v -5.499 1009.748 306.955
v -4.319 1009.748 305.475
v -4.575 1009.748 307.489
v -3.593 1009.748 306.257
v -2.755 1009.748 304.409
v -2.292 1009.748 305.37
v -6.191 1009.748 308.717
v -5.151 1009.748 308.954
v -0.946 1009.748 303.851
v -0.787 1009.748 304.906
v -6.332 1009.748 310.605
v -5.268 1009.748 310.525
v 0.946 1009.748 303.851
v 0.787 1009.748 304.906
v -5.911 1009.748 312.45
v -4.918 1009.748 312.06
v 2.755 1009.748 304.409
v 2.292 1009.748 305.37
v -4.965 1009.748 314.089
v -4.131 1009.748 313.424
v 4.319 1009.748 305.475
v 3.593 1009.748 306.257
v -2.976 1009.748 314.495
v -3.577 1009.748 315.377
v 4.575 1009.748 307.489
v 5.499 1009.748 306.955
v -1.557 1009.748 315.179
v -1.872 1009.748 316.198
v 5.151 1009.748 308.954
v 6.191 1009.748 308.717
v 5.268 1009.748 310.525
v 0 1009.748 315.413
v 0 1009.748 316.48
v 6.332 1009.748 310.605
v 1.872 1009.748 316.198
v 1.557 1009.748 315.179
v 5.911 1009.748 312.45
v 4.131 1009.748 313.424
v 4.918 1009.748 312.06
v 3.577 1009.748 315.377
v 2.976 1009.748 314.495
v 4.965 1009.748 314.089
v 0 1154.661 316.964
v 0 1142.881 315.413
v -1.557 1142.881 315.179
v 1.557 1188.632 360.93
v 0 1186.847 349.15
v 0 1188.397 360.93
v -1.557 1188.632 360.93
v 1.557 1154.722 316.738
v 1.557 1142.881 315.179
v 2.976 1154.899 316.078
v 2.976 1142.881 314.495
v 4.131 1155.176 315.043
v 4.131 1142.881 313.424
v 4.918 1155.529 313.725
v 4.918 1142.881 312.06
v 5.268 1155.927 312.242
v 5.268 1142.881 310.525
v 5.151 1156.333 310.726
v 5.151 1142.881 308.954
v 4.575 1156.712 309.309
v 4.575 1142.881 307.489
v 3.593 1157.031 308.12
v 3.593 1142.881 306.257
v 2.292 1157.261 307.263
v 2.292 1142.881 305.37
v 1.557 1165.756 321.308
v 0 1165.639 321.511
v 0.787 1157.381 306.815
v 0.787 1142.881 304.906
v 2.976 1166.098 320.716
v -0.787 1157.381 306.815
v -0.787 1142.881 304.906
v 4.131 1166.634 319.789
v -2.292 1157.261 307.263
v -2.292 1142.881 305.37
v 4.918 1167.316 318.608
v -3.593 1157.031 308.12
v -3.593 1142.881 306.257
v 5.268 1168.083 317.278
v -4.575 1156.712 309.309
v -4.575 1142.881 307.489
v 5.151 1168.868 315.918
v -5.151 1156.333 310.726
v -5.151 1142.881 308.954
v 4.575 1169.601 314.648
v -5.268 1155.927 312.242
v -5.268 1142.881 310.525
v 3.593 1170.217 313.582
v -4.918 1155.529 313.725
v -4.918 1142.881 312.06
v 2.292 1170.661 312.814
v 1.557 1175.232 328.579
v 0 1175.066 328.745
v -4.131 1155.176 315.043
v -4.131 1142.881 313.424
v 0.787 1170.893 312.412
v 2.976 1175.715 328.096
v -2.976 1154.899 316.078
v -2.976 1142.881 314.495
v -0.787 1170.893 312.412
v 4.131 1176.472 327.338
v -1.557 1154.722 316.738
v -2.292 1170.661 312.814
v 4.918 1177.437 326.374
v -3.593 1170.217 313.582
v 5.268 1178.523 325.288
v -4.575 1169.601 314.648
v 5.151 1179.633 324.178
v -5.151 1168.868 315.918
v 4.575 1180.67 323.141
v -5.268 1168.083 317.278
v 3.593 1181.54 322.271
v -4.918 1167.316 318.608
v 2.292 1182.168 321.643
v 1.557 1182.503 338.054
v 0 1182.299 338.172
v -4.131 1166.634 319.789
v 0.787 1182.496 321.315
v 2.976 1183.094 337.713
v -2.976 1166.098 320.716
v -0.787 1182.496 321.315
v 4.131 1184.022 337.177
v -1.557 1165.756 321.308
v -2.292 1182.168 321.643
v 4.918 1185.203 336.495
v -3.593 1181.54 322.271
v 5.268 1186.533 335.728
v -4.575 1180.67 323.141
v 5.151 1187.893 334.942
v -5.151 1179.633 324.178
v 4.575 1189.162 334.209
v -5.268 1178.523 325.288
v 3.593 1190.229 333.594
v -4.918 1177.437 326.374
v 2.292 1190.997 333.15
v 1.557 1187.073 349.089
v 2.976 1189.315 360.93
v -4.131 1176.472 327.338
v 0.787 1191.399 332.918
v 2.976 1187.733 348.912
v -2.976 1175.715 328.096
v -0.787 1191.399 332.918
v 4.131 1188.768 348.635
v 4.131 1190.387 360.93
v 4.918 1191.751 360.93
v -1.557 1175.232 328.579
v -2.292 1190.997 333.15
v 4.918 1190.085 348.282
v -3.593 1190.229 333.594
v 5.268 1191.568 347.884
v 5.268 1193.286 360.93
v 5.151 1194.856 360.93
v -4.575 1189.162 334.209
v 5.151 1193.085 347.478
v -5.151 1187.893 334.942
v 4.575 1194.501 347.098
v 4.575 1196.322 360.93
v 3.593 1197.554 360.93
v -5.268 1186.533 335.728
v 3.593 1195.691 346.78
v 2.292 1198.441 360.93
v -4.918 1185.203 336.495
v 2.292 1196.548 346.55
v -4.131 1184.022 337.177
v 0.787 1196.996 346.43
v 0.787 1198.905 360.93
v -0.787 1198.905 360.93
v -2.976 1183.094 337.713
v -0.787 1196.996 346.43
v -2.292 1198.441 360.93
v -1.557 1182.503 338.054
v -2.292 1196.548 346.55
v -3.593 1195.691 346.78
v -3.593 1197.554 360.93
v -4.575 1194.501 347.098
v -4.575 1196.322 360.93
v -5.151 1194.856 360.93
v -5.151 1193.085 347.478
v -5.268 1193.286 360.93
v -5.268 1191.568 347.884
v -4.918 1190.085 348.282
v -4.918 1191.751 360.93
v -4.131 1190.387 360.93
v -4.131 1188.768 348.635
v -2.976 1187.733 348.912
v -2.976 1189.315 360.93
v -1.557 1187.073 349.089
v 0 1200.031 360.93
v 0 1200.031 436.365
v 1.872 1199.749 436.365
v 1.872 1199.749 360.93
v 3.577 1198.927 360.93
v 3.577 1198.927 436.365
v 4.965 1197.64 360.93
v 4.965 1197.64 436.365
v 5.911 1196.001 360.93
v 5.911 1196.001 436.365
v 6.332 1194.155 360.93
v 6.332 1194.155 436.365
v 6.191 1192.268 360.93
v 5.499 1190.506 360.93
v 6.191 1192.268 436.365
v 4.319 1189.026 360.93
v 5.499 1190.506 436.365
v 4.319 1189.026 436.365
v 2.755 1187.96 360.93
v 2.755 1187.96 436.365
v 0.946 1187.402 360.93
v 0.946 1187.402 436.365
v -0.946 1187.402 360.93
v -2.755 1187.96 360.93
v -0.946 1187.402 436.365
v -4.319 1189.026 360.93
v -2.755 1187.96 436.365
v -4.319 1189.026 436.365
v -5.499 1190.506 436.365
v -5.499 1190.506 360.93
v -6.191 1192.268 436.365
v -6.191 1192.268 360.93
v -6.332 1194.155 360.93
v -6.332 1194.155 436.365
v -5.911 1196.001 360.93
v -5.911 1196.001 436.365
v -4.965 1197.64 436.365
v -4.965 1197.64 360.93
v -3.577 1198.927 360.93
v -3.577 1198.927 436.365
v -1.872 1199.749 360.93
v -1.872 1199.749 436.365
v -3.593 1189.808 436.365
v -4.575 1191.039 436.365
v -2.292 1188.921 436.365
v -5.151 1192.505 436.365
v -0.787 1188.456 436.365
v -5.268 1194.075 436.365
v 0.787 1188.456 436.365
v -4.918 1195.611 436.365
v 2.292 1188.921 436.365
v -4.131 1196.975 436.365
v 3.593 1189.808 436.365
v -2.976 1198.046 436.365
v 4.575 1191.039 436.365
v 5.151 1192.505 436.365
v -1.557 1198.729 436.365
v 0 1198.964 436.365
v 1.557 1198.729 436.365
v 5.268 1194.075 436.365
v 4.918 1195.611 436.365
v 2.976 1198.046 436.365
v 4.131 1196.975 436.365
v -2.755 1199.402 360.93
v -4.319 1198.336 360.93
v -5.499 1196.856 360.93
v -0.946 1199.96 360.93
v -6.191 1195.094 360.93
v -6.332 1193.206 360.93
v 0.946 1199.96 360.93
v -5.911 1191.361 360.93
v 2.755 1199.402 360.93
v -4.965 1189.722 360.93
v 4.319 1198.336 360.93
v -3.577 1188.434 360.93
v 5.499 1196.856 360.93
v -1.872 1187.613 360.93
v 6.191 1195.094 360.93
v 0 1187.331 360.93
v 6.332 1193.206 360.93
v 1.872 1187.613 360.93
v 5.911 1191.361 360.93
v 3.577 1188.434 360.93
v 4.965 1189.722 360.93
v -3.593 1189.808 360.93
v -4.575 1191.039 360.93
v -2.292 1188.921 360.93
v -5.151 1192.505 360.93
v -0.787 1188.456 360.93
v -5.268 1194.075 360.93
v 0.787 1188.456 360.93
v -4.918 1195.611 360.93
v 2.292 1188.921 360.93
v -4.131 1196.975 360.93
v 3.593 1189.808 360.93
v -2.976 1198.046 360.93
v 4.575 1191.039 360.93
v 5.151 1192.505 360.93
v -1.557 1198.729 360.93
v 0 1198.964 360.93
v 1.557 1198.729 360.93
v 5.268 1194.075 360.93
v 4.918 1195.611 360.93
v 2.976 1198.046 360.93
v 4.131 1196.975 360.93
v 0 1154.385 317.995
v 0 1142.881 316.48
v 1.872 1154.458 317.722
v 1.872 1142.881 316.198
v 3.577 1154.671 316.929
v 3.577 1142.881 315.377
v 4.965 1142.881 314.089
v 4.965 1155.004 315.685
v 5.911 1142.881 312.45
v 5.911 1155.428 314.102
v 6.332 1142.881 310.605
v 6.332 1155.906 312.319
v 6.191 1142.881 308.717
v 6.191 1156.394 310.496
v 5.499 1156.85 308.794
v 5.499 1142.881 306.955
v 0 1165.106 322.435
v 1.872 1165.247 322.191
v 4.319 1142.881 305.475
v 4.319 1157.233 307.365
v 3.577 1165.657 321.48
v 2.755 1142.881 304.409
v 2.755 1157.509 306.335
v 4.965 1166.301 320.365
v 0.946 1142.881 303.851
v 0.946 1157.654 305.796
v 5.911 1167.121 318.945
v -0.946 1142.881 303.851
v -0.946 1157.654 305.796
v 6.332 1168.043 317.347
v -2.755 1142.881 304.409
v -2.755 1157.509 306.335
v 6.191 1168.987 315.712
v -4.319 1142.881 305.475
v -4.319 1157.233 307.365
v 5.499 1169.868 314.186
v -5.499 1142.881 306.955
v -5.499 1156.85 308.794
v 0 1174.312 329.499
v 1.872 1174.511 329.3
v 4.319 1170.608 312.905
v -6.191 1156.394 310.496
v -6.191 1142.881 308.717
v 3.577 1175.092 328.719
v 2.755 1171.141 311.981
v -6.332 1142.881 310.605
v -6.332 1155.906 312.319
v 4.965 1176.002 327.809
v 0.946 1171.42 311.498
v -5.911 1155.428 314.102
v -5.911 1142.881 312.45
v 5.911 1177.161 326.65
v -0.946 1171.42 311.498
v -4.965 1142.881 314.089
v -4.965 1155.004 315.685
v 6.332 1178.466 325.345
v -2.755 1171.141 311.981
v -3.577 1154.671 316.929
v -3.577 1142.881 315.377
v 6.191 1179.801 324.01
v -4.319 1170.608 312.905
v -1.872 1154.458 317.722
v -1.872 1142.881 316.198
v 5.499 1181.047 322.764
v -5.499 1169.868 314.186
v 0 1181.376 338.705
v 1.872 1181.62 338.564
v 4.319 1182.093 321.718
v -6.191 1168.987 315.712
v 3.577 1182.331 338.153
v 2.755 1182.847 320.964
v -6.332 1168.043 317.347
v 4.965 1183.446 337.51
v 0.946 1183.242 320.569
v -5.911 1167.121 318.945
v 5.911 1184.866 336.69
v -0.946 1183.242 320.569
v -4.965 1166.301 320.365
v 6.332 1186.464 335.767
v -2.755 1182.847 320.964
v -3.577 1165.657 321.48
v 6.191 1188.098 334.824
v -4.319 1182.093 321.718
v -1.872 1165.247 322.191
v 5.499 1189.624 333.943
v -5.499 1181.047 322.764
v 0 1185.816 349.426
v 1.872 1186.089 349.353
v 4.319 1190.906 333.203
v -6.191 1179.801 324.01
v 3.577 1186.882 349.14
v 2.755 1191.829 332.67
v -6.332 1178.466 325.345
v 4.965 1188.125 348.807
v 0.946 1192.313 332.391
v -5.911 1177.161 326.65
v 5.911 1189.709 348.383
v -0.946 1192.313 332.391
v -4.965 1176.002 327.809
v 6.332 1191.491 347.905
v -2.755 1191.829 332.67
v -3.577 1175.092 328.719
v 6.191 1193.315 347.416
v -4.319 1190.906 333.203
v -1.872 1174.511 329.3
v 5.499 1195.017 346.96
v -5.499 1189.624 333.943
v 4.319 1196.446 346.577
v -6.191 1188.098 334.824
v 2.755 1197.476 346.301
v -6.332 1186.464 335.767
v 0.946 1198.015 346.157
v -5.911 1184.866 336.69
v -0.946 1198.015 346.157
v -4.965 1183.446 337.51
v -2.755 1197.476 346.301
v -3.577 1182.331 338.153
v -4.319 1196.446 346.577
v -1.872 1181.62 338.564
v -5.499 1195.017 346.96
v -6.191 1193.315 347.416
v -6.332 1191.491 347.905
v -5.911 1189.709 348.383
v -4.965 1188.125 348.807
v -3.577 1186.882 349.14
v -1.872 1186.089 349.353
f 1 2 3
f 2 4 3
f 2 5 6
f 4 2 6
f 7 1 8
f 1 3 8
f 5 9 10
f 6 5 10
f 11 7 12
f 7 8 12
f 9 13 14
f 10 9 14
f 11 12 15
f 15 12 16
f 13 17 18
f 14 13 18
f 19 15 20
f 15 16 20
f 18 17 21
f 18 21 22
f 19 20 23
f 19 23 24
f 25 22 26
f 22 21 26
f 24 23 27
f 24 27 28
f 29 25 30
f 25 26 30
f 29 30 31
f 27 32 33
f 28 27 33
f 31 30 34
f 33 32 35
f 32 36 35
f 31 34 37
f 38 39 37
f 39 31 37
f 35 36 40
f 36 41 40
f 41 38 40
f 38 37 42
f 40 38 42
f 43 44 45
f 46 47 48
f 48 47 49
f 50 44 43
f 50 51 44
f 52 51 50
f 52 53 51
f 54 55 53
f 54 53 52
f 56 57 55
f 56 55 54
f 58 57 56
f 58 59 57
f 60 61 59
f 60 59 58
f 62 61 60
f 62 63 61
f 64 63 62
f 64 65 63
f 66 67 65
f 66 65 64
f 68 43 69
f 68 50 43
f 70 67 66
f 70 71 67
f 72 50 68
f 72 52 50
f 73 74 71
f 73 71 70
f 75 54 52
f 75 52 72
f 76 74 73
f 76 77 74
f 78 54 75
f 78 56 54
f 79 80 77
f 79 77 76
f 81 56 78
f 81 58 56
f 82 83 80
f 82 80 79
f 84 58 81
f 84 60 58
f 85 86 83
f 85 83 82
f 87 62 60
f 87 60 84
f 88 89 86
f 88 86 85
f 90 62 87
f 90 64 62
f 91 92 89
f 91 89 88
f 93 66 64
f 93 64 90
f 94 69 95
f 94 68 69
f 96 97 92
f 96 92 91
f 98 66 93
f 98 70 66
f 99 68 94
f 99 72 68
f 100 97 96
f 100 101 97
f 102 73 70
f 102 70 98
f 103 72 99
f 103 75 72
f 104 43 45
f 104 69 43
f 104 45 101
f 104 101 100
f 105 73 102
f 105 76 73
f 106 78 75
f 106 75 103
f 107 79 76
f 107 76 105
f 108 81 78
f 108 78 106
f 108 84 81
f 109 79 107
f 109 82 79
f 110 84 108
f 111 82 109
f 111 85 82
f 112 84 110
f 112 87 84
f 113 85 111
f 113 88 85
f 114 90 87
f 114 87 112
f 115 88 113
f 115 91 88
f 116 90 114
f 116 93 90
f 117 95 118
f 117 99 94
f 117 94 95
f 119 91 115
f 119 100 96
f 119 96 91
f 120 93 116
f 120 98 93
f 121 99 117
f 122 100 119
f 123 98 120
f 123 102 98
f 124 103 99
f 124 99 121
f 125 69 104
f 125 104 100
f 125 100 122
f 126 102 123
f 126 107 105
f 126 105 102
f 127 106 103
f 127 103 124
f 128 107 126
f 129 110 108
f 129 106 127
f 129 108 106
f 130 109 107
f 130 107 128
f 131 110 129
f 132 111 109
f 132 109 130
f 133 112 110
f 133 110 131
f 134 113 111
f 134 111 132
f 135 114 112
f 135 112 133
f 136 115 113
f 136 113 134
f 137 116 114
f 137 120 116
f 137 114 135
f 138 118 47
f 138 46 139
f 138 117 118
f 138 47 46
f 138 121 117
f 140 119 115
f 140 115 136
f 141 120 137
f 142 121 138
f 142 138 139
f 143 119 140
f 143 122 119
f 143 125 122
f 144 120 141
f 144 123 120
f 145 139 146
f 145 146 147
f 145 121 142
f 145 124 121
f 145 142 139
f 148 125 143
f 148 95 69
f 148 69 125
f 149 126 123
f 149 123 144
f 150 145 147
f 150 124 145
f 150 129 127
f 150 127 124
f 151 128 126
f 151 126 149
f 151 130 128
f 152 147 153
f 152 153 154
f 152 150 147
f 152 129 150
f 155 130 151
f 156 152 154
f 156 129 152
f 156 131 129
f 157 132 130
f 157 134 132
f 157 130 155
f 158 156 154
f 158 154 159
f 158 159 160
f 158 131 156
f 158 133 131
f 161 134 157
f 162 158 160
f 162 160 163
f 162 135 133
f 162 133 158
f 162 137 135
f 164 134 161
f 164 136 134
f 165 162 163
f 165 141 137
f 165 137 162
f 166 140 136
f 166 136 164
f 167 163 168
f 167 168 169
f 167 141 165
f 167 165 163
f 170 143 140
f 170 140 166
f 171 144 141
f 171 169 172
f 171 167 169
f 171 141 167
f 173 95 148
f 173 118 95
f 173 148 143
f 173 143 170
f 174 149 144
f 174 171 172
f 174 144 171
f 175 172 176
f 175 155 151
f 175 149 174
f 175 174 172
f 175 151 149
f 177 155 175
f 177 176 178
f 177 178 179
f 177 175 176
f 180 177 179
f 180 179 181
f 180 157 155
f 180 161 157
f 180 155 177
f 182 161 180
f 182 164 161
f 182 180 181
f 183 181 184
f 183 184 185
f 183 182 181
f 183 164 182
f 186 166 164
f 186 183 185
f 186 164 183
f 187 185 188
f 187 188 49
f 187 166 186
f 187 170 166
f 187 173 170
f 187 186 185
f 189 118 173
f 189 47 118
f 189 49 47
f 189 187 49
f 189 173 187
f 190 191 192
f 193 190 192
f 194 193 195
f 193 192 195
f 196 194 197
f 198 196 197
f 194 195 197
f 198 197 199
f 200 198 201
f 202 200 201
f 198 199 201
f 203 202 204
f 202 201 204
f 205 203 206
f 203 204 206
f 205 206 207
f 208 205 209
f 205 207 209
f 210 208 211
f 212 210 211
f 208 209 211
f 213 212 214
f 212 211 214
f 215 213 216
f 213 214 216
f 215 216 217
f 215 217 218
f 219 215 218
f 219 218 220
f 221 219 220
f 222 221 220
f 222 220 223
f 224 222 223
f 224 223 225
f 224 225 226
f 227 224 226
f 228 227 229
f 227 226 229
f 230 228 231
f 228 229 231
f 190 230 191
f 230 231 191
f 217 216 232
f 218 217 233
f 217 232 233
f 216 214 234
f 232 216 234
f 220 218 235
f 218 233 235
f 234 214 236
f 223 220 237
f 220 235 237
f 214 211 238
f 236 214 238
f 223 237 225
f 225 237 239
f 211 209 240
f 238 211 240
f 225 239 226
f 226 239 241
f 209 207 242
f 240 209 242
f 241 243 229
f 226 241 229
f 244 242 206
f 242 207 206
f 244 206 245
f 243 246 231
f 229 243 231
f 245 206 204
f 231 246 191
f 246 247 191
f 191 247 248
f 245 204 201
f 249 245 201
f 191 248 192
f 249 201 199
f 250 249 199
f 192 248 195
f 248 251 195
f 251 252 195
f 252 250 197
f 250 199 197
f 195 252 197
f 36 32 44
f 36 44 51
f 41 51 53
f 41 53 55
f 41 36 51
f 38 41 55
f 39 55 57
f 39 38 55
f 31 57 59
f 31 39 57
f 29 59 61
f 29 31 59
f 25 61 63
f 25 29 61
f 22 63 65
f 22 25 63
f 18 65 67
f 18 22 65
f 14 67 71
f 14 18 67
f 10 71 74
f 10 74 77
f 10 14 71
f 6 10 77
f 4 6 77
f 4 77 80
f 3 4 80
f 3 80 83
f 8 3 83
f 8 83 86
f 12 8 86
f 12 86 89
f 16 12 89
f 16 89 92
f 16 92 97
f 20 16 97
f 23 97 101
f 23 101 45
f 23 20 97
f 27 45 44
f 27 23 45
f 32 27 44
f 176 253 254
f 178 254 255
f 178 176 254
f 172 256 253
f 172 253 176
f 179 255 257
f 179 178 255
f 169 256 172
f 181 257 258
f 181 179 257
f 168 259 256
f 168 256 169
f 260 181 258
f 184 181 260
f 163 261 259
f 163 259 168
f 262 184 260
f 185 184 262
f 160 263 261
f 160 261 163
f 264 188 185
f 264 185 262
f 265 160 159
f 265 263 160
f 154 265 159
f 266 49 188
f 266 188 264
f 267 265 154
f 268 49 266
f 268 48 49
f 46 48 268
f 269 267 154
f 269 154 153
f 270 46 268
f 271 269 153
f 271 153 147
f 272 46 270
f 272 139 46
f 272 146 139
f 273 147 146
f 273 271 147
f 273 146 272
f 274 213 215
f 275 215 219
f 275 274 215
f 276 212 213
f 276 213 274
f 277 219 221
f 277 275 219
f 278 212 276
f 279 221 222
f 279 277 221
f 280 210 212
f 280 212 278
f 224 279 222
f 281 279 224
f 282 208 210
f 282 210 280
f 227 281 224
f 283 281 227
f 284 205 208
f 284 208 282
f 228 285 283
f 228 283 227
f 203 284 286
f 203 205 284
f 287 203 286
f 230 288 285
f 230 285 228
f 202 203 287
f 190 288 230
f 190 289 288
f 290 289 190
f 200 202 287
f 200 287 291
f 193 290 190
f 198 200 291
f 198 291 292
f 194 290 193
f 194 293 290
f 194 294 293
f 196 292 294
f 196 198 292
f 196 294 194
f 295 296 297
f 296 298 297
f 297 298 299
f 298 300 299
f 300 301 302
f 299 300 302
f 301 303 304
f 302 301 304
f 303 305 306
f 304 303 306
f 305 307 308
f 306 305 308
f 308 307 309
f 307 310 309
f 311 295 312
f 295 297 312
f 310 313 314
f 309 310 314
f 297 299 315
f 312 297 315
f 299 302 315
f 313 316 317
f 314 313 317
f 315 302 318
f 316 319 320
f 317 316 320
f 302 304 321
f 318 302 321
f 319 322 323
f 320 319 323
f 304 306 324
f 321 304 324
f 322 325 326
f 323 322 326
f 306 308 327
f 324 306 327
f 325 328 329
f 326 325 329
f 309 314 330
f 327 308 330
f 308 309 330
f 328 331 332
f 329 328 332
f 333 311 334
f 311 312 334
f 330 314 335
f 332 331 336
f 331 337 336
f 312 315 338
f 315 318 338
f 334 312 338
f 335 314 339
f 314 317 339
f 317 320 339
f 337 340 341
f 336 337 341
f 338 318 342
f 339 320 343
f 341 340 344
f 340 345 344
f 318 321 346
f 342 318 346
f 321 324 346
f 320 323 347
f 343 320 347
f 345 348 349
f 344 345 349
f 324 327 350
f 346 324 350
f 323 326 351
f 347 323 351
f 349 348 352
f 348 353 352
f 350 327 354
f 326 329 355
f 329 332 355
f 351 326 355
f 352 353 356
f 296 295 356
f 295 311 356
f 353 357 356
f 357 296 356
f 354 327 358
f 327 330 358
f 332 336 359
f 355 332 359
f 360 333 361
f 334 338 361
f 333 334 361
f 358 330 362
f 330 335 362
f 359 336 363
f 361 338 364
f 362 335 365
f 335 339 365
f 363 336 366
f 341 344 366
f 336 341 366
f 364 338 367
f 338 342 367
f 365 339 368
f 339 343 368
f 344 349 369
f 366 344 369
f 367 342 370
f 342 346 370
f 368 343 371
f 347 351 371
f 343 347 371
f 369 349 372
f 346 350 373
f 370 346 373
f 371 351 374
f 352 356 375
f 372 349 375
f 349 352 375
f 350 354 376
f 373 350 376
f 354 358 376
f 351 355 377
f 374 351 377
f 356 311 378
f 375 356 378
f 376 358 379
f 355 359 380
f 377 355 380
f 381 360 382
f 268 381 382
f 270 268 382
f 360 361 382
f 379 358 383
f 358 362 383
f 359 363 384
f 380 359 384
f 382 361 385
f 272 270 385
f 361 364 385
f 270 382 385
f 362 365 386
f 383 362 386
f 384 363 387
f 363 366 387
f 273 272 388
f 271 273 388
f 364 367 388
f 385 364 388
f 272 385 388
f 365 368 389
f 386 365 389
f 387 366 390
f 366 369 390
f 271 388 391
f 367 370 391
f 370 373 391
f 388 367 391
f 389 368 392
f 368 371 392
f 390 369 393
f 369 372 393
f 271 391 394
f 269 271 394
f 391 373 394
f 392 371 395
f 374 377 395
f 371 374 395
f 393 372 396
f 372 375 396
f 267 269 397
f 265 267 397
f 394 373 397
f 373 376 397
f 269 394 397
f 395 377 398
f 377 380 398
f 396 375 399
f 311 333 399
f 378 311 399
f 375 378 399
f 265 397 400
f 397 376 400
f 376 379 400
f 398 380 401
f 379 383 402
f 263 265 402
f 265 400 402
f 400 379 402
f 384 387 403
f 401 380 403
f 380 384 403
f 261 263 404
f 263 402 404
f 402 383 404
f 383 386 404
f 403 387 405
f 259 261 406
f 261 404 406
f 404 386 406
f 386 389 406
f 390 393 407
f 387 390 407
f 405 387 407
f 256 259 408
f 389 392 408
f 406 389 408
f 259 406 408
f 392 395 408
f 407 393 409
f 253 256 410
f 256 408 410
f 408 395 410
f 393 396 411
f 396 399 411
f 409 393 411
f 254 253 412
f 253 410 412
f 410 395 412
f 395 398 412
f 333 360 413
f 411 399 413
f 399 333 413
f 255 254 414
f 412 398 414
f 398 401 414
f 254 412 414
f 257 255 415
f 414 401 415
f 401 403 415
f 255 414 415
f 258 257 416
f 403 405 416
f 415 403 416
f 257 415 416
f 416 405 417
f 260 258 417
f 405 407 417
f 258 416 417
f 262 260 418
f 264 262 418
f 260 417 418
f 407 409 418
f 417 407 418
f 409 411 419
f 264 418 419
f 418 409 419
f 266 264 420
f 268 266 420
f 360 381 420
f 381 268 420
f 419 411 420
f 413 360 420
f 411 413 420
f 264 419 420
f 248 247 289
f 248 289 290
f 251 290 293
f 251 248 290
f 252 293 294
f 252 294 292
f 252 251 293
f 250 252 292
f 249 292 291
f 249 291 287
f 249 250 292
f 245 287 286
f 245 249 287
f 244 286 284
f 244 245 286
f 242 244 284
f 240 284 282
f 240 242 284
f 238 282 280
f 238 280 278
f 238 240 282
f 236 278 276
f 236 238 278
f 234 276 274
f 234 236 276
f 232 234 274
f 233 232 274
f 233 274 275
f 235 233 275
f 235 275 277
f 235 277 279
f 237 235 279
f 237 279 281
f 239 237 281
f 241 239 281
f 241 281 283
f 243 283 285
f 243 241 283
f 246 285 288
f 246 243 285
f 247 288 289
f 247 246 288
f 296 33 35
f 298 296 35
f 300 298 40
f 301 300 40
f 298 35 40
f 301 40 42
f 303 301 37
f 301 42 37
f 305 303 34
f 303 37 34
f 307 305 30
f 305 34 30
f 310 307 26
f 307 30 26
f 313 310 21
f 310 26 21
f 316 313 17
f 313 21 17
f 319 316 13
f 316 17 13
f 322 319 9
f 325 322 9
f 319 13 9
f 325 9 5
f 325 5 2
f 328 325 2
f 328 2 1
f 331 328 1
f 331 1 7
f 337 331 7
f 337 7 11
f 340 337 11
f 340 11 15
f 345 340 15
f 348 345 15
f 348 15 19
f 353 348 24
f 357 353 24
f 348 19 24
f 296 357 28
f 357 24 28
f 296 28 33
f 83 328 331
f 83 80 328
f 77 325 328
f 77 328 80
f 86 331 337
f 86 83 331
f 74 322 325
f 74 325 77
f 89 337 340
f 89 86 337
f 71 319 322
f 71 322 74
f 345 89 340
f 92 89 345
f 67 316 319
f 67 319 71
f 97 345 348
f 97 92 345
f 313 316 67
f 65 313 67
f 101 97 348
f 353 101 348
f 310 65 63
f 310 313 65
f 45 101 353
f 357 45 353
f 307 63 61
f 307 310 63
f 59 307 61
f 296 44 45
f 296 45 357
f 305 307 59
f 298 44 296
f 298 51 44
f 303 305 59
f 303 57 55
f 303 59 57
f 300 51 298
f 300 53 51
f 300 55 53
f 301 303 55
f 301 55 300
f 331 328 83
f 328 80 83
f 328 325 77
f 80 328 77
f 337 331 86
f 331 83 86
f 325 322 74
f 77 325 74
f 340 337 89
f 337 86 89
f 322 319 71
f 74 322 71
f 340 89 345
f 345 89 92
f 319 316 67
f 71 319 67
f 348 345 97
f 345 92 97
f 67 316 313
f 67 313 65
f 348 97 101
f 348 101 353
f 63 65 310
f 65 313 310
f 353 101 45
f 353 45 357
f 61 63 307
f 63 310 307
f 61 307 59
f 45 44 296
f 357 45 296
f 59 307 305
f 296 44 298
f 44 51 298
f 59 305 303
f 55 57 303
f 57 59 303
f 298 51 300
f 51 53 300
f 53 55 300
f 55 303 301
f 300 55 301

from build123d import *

# Parameters (mm, degrees)
SKETCH11_R                = 6.35
SKETCH11_R_2              = 5.2832
PIPE_0_5_SCH_40_1_DEPTH   = 133.132879549
SKETCH11_ON_SEGMENT_2_R   = 6.35
SKETCH11_ON_SEGMENT_2_R_2 = 5.2832
PIPE_0_5_SCH_40_1_2_ANGLE = 90
SKETCH11_ON_SEGMENT_3_R   = 6.35
SKETCH11_ON_SEGMENT_3_R_2 = 5.2832
PIPE_0_5_SCH_40_1_3_DEPTH = 75.434862272


with BuildPart() as part:
    # Sketch11 → Pipe 0.5 SCH 40(1) (new body)
    with BuildSketch(Plane(origin=(0, 1009.74779895, 310.130117333), x_dir=(0, 0, 1), z_dir=(0, 1, 0))):
        Circle(SKETCH11_R)
        Circle(SKETCH11_R_2, mode=Mode.SUBTRACT)
    extrude(amount=PIPE_0_5_SCH_40_1_DEPTH)


with BuildPart() as body_2:
    # Sketch11 on segment 2 (carried to the start of arc 2) → Pipe 0.5 SCH 40_1 2 (revolve)
    with BuildSketch(Plane(origin=(0, 1142.880678498, 310.130117333), x_dir=(0, 0, 1), z_dir=(0, 1, 0))):
        Circle(SKETCH11_ON_SEGMENT_2_R)
        Circle(SKETCH11_ON_SEGMENT_2_R_2, mode=Mode.SUBTRACT)
    revolve(axis=Axis((0, 1142.880678498, 360.930117333), (1, 0, 0)), revolution_arc=PIPE_0_5_SCH_40_1_2_ANGLE)


with BuildPart() as body_3:
    # Sketch11 on segment 3 (carried to segment 3) → Pipe 0.5 SCH 40_1 3 (new body)
    with BuildSketch(Plane(origin=(0, 1193.680678498, 436.364979606), x_dir=(0, 1, 0), z_dir=(0, 0, -1))):
        Circle(SKETCH11_ON_SEGMENT_3_R)
        Circle(SKETCH11_ON_SEGMENT_3_R_2, mode=Mode.SUBTRACT)
    extrude(amount=PIPE_0_5_SCH_40_1_3_DEPTH)


solid = Compound([part.part, body_2.part, body_3.part])
